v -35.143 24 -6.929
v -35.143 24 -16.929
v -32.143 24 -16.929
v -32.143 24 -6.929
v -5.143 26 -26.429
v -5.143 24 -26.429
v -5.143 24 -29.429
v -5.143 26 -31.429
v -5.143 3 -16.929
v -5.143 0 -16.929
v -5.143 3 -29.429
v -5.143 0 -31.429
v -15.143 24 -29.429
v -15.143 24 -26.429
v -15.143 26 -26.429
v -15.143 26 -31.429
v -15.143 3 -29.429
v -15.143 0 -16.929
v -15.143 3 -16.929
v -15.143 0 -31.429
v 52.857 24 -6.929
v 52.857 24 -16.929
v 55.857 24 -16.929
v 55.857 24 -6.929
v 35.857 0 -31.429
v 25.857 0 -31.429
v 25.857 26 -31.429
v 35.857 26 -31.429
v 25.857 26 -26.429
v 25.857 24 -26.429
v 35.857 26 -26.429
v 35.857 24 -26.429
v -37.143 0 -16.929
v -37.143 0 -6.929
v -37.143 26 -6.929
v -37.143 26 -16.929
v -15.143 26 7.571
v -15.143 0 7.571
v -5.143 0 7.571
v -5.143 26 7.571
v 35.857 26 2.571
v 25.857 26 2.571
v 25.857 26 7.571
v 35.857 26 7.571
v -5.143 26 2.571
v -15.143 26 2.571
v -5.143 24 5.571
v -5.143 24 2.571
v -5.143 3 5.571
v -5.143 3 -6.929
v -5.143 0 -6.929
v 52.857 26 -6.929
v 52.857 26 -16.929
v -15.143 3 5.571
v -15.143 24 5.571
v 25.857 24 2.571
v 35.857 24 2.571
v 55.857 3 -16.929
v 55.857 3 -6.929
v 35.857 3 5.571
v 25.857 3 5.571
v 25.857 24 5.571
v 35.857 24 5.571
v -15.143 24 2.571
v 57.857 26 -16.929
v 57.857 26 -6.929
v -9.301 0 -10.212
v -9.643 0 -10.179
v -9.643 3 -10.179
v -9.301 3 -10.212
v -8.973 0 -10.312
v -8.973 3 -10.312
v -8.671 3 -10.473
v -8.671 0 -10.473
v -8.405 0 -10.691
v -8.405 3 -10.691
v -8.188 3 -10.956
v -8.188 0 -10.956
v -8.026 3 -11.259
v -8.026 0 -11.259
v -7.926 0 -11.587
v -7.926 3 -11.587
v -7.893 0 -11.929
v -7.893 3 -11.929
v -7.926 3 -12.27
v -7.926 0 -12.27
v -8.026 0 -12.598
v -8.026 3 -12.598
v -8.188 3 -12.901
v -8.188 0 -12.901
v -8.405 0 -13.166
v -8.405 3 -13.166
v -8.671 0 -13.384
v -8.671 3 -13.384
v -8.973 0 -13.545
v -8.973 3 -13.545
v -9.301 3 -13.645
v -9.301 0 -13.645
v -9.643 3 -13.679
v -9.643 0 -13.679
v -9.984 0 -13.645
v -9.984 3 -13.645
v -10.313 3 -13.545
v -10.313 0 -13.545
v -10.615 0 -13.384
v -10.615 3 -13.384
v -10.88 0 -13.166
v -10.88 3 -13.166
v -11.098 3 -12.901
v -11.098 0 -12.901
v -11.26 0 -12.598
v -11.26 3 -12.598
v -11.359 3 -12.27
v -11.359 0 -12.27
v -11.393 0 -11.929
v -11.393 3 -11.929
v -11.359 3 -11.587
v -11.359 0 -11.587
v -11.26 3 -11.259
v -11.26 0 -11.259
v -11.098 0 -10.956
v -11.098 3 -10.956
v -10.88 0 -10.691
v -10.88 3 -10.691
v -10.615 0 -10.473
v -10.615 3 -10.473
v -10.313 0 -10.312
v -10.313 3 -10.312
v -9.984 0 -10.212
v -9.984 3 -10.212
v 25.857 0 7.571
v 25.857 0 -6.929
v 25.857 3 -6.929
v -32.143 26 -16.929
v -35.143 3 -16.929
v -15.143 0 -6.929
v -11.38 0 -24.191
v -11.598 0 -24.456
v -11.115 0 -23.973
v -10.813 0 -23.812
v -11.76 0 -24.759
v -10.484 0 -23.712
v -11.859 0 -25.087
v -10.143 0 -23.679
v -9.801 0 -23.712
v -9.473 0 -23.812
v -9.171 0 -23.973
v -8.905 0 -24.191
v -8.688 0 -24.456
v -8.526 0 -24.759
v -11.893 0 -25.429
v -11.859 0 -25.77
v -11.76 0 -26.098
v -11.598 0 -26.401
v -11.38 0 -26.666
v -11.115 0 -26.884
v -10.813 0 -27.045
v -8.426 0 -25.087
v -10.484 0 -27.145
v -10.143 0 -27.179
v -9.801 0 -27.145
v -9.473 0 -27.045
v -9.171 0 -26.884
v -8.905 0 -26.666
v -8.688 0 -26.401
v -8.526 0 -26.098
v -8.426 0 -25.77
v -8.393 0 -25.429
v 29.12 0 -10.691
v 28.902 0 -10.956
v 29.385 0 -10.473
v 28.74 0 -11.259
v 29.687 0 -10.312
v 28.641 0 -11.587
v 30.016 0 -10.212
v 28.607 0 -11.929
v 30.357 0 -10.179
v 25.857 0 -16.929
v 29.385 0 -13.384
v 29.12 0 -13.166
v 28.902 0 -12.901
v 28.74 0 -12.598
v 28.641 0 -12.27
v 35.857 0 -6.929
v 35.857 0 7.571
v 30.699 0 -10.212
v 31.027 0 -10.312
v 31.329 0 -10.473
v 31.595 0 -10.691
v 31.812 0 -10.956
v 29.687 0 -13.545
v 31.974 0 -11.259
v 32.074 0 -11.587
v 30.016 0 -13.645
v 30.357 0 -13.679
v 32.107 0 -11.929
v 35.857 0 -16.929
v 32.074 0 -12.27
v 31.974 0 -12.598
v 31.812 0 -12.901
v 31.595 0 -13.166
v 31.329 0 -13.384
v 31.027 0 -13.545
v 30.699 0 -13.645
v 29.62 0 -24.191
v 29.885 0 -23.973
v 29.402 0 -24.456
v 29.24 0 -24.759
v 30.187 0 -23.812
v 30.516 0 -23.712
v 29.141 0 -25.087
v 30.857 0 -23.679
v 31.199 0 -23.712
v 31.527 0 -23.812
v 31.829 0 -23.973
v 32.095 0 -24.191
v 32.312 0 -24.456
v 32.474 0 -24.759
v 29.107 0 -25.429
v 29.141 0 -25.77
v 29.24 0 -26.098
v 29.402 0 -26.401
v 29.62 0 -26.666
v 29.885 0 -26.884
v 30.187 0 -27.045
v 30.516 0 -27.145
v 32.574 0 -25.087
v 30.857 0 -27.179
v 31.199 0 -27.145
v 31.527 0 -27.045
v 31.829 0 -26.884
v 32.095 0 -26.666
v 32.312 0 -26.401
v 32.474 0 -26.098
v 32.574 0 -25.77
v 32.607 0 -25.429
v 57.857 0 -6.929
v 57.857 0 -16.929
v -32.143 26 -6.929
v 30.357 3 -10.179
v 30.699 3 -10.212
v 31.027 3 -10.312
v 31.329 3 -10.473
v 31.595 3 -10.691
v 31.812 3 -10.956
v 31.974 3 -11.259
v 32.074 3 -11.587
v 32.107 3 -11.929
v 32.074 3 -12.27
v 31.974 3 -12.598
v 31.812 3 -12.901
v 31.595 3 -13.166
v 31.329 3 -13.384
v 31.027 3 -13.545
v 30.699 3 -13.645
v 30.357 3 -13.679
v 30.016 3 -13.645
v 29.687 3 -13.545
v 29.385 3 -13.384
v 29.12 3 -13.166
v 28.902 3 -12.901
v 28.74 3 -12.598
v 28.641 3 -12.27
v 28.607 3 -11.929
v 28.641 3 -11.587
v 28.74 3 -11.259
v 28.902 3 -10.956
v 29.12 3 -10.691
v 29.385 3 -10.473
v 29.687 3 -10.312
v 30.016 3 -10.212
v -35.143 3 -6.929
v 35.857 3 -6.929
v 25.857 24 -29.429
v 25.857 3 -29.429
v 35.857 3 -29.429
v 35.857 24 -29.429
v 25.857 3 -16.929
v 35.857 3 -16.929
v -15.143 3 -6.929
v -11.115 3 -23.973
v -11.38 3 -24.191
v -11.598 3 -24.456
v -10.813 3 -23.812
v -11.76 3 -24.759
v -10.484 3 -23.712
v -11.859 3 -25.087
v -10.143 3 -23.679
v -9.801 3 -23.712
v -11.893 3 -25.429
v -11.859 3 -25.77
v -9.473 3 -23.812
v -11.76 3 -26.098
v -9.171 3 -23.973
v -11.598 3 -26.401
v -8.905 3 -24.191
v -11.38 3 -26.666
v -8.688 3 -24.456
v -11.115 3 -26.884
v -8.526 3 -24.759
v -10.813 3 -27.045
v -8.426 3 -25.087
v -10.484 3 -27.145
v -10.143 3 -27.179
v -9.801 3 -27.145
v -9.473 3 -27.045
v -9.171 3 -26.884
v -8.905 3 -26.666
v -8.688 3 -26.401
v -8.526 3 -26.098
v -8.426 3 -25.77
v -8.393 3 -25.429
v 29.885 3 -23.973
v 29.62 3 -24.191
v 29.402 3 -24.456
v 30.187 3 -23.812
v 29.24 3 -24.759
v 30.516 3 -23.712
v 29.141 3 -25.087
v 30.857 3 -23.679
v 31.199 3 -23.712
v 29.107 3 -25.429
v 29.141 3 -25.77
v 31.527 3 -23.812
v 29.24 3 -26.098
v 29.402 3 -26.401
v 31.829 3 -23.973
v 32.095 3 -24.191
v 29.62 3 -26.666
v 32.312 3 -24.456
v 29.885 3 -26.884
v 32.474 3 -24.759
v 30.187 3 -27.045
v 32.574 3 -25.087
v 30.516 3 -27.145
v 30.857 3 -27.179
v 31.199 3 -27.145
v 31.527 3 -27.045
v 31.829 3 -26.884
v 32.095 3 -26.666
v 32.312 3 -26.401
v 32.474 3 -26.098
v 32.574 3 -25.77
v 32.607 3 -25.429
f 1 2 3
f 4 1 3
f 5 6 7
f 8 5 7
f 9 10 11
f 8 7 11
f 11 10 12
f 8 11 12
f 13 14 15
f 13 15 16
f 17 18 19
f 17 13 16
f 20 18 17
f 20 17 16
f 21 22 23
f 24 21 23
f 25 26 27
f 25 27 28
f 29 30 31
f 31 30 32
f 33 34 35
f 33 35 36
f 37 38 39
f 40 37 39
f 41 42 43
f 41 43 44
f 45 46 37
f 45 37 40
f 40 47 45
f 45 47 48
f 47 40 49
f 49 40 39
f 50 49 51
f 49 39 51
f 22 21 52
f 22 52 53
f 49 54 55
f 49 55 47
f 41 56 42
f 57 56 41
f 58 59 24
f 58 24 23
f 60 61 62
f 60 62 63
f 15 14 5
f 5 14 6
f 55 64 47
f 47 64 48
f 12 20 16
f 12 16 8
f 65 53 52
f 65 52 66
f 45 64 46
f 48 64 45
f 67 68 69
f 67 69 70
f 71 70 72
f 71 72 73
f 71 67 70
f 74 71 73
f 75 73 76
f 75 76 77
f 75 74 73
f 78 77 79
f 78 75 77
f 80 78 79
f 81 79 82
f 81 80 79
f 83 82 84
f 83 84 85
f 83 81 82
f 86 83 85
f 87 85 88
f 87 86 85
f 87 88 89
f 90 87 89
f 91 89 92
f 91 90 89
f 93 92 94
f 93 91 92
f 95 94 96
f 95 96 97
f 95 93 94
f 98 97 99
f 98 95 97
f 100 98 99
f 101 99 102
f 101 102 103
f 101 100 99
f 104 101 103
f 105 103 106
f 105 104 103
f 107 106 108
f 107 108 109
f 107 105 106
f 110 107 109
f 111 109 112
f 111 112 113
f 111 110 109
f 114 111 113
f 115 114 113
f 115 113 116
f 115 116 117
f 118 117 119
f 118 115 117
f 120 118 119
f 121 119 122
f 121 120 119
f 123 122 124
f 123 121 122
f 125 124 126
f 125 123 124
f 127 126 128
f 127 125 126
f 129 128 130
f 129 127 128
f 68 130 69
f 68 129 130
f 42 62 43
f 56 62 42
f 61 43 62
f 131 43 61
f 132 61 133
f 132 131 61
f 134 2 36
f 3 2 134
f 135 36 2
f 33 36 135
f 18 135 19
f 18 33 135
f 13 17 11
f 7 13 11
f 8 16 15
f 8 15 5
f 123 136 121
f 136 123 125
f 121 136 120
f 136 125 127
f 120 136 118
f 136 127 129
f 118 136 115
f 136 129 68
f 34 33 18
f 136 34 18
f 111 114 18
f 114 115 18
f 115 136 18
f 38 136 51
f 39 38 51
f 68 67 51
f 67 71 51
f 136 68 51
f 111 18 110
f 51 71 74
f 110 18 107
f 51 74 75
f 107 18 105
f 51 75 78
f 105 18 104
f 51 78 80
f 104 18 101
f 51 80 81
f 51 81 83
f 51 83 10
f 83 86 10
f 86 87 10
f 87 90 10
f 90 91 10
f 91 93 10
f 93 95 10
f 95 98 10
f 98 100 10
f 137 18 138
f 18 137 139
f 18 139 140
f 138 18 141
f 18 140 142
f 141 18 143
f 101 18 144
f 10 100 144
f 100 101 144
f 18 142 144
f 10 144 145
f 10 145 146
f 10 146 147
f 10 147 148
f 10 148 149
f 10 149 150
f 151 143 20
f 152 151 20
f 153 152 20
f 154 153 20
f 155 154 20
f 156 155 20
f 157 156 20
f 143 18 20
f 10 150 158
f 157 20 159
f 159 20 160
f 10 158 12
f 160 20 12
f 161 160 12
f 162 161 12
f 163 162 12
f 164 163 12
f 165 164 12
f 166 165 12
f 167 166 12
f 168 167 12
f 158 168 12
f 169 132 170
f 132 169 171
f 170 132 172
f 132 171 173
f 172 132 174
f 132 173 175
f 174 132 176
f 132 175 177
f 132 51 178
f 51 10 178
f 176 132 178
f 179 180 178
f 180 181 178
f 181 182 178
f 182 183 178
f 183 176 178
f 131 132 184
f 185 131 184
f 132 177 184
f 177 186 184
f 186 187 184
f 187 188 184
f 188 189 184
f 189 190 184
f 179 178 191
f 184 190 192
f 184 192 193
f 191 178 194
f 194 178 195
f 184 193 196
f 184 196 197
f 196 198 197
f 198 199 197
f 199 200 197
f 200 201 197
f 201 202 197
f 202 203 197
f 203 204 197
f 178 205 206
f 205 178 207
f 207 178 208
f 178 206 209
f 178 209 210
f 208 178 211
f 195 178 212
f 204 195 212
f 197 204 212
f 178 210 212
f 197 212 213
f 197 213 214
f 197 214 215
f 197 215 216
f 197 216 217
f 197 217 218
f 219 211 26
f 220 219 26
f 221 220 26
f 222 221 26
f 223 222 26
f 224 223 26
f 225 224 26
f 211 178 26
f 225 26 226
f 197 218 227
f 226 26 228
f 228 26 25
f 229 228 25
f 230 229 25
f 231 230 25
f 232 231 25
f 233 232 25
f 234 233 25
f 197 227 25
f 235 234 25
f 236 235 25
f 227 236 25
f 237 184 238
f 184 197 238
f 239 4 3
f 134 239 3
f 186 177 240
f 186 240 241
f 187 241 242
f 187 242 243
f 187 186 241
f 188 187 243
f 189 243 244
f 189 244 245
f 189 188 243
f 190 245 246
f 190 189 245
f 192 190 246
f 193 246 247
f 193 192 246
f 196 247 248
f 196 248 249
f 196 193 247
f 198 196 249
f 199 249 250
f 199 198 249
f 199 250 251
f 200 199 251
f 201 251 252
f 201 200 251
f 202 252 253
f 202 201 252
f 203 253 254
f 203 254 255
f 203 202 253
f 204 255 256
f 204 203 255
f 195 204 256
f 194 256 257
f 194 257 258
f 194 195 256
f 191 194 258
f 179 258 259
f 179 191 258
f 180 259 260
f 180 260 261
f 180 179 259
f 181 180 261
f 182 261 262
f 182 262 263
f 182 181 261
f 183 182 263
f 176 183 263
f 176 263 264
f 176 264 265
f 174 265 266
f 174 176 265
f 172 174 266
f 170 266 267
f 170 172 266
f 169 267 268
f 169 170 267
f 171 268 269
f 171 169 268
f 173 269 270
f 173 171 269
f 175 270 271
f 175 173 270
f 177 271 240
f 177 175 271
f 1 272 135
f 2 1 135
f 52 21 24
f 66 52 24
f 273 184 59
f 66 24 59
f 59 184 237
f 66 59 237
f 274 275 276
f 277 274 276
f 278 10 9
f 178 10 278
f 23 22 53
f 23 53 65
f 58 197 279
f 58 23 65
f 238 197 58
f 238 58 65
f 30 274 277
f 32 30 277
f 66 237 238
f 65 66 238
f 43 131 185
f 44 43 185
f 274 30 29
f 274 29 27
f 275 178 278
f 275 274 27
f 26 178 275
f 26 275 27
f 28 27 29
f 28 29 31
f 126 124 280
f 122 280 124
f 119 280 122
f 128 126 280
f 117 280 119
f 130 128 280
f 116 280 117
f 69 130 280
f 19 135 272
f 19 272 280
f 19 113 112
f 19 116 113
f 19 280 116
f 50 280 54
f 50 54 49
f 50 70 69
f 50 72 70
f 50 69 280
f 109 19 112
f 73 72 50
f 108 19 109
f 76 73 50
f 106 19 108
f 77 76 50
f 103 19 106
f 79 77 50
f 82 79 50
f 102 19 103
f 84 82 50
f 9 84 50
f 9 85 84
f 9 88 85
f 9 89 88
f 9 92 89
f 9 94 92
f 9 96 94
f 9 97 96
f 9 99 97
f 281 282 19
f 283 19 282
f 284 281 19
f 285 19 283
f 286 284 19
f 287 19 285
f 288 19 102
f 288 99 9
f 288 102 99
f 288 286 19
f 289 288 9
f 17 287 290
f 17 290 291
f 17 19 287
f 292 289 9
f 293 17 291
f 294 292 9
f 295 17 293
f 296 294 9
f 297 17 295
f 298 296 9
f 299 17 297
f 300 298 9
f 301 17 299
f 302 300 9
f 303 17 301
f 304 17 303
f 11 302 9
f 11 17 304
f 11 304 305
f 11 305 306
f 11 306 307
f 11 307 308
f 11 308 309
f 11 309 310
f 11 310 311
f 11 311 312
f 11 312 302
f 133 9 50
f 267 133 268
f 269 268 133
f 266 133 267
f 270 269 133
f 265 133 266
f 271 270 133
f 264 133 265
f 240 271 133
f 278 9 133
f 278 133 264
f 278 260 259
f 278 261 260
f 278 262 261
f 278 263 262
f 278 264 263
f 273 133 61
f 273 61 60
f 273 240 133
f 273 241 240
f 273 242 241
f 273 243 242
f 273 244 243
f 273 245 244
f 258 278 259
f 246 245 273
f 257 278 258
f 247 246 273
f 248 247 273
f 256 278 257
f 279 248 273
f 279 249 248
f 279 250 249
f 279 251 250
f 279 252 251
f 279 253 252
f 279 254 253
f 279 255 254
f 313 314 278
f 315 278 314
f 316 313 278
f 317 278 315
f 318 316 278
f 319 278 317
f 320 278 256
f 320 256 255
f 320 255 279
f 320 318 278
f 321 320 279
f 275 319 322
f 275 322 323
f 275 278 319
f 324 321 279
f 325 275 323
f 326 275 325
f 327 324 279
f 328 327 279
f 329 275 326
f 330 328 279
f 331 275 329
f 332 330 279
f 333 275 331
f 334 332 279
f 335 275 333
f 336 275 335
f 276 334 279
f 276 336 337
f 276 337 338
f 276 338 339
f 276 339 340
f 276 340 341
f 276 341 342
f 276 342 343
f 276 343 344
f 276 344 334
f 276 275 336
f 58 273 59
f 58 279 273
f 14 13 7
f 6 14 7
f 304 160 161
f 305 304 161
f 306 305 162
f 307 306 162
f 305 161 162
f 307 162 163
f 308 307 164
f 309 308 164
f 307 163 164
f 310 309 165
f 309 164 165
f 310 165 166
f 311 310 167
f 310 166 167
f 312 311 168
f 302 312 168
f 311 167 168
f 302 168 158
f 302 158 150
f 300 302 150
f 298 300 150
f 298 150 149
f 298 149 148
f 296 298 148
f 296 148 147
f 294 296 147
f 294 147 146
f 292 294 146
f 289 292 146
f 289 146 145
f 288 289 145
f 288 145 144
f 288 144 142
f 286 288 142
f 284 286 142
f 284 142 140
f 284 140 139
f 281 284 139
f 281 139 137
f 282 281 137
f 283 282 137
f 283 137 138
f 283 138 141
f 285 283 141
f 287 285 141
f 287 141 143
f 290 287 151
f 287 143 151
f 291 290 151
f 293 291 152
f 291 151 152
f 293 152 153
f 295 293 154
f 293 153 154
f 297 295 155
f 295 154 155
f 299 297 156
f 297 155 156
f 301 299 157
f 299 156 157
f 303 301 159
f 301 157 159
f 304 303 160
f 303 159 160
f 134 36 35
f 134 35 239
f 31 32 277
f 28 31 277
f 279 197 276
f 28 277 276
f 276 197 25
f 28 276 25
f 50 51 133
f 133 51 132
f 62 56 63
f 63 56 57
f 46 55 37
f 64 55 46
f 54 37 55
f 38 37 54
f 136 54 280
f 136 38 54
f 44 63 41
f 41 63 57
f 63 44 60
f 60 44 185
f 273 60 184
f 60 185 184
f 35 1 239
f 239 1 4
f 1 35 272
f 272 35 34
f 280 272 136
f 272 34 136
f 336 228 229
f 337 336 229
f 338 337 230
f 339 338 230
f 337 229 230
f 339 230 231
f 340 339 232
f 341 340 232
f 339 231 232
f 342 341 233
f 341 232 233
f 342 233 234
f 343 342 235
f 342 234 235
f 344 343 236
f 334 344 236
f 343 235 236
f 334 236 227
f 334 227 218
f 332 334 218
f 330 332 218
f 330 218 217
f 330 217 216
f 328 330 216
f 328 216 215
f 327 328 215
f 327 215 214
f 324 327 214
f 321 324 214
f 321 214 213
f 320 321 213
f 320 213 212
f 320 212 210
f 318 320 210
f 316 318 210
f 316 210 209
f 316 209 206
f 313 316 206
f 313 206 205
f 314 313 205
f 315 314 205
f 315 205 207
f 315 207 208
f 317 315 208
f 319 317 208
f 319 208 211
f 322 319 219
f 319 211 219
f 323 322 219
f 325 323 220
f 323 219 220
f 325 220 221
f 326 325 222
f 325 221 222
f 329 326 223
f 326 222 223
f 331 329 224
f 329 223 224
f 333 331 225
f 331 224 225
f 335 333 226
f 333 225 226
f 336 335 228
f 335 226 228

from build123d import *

# Parameters (mm, degrees)
SKETCH1_R           = 1.75
BOSS_EXTRUDE1_DEPTH = 3
SKETCH1_3_W         = 2
SKETCH1_3_H         = 10
SKETCH1_3_W_2       = 10
SKETCH1_3_H_2       = 2
BOSS_EXTRUDE2_DEPTH = 24
SKETCH2_W           = 10
SKETCH2_H           = 5
SKETCH2_W_2         = 5
SKETCH2_H_2         = 10
BOSS_EXTRUDE3_DEPTH = 2
SKETCH3_R           = 1.75
CUT_EXTRUDE1_DEPTH  = 12


with BuildPart() as part:
    # Sketch1 → Boss-Extrude1 (new body)
    with BuildSketch(Plane(origin=(0, 0, 0), x_dir=(1, 0, 0), z_dir=(0, 1, 0))):
        Polygon((-15.142857143, 16.928571429), (-35.142857143, 16.928571429), (-35.142857143, 6.928571429), (-15.142857143, 6.928571429), (-15.142857143, -5.571428571), (-5.142857143, -5.571428571), (-5.142857143, 6.928571429), (25.857142857, 6.928571429), (25.857142857, -5.571428571), (35.857142857, -5.571428571), (35.857142857, 6.928571429), (55.857142857, 6.928571429), (55.857142857, 16.928571429), (35.857142857, 16.928571429), (35.857142857, 29.428571429), (25.857142857, 29.428571429), (25.857142857, 16.928571429), (-5.142857143, 16.928571429), (-5.142857143, 29.428571429), (-15.142857143, 29.428571429), align=None)
        with Locations((-9.642857143, 11.928571429)):
            Circle(SKETCH1_R, mode=Mode.SUBTRACT)
        with Locations((30.357142857, 11.928571429)):
            Circle(SKETCH1_R, mode=Mode.SUBTRACT)
    extrude(amount=BOSS_EXTRUDE1_DEPTH)

    # Sketch1<3> → Boss-Extrude2 (add)
    with BuildSketch(Plane(origin=(0, 0, 0), x_dir=(1, 0, 0), z_dir=(0, 1, 0))):
        with Locations((-36.142857143, 11.928571429)):
            Rectangle(SKETCH1_3_W, SKETCH1_3_H)
        with Locations((-10.142857143, 30.428571429)):
            Rectangle(SKETCH1_3_W_2, SKETCH1_3_H_2)
        with Locations((-10.142857143, -6.571428571)):
            Rectangle(SKETCH1_3_W_2, SKETCH1_3_H_2)
        with Locations((30.857142857, 30.428571429)):
            Rectangle(SKETCH1_3_W_2, SKETCH1_3_H_2)
        with Locations((56.857142857, 11.928571429)):
            Rectangle(SKETCH1_3_W, SKETCH1_3_H)
        with Locations((30.857142857, -6.571428571)):
            Rectangle(SKETCH1_3_W_2, SKETCH1_3_H_2)
    extrude(amount=BOSS_EXTRUDE2_DEPTH)

    # Sketch2 → Boss-Extrude3 (add)
    with BuildSketch(Plane(origin=(0, 24, 0), x_dir=(1, 0, 0), z_dir=(0, 1, 0))):
        with Locations((-10.142857143, 28.928571429)):
            Rectangle(SKETCH2_W, SKETCH2_H)
        with Locations((30.857142857, 28.928571429)):
            Rectangle(SKETCH2_W, SKETCH2_H)
        with Locations((55.357142857, 11.928571429)):
            Rectangle(SKETCH2_W_2, SKETCH2_H_2)
        with Locations((30.857142857, -5.071428571)):
            Rectangle(SKETCH2_W, SKETCH2_H)
        with Locations((-10.142857143, -5.071428571)):
            Rectangle(SKETCH2_W, SKETCH2_H)
        with Locations((-34.642857143, 11.928571429)):
            Rectangle(SKETCH2_W_2, SKETCH2_H_2)
    extrude(amount=BOSS_EXTRUDE3_DEPTH)

    # Sketch3 → Cut-Extrude1 (cut)
    with BuildSketch(Plane.XZ):
        with Locations((-10.142857143, -25.428571429)):
            Circle(SKETCH3_R)
        with Locations((30.857142857, -25.428571429)):
            Circle(SKETCH3_R)
    extrude(amount=-CUT_EXTRUDE1_DEPTH, mode=Mode.SUBTRACT)


solid = part.part
